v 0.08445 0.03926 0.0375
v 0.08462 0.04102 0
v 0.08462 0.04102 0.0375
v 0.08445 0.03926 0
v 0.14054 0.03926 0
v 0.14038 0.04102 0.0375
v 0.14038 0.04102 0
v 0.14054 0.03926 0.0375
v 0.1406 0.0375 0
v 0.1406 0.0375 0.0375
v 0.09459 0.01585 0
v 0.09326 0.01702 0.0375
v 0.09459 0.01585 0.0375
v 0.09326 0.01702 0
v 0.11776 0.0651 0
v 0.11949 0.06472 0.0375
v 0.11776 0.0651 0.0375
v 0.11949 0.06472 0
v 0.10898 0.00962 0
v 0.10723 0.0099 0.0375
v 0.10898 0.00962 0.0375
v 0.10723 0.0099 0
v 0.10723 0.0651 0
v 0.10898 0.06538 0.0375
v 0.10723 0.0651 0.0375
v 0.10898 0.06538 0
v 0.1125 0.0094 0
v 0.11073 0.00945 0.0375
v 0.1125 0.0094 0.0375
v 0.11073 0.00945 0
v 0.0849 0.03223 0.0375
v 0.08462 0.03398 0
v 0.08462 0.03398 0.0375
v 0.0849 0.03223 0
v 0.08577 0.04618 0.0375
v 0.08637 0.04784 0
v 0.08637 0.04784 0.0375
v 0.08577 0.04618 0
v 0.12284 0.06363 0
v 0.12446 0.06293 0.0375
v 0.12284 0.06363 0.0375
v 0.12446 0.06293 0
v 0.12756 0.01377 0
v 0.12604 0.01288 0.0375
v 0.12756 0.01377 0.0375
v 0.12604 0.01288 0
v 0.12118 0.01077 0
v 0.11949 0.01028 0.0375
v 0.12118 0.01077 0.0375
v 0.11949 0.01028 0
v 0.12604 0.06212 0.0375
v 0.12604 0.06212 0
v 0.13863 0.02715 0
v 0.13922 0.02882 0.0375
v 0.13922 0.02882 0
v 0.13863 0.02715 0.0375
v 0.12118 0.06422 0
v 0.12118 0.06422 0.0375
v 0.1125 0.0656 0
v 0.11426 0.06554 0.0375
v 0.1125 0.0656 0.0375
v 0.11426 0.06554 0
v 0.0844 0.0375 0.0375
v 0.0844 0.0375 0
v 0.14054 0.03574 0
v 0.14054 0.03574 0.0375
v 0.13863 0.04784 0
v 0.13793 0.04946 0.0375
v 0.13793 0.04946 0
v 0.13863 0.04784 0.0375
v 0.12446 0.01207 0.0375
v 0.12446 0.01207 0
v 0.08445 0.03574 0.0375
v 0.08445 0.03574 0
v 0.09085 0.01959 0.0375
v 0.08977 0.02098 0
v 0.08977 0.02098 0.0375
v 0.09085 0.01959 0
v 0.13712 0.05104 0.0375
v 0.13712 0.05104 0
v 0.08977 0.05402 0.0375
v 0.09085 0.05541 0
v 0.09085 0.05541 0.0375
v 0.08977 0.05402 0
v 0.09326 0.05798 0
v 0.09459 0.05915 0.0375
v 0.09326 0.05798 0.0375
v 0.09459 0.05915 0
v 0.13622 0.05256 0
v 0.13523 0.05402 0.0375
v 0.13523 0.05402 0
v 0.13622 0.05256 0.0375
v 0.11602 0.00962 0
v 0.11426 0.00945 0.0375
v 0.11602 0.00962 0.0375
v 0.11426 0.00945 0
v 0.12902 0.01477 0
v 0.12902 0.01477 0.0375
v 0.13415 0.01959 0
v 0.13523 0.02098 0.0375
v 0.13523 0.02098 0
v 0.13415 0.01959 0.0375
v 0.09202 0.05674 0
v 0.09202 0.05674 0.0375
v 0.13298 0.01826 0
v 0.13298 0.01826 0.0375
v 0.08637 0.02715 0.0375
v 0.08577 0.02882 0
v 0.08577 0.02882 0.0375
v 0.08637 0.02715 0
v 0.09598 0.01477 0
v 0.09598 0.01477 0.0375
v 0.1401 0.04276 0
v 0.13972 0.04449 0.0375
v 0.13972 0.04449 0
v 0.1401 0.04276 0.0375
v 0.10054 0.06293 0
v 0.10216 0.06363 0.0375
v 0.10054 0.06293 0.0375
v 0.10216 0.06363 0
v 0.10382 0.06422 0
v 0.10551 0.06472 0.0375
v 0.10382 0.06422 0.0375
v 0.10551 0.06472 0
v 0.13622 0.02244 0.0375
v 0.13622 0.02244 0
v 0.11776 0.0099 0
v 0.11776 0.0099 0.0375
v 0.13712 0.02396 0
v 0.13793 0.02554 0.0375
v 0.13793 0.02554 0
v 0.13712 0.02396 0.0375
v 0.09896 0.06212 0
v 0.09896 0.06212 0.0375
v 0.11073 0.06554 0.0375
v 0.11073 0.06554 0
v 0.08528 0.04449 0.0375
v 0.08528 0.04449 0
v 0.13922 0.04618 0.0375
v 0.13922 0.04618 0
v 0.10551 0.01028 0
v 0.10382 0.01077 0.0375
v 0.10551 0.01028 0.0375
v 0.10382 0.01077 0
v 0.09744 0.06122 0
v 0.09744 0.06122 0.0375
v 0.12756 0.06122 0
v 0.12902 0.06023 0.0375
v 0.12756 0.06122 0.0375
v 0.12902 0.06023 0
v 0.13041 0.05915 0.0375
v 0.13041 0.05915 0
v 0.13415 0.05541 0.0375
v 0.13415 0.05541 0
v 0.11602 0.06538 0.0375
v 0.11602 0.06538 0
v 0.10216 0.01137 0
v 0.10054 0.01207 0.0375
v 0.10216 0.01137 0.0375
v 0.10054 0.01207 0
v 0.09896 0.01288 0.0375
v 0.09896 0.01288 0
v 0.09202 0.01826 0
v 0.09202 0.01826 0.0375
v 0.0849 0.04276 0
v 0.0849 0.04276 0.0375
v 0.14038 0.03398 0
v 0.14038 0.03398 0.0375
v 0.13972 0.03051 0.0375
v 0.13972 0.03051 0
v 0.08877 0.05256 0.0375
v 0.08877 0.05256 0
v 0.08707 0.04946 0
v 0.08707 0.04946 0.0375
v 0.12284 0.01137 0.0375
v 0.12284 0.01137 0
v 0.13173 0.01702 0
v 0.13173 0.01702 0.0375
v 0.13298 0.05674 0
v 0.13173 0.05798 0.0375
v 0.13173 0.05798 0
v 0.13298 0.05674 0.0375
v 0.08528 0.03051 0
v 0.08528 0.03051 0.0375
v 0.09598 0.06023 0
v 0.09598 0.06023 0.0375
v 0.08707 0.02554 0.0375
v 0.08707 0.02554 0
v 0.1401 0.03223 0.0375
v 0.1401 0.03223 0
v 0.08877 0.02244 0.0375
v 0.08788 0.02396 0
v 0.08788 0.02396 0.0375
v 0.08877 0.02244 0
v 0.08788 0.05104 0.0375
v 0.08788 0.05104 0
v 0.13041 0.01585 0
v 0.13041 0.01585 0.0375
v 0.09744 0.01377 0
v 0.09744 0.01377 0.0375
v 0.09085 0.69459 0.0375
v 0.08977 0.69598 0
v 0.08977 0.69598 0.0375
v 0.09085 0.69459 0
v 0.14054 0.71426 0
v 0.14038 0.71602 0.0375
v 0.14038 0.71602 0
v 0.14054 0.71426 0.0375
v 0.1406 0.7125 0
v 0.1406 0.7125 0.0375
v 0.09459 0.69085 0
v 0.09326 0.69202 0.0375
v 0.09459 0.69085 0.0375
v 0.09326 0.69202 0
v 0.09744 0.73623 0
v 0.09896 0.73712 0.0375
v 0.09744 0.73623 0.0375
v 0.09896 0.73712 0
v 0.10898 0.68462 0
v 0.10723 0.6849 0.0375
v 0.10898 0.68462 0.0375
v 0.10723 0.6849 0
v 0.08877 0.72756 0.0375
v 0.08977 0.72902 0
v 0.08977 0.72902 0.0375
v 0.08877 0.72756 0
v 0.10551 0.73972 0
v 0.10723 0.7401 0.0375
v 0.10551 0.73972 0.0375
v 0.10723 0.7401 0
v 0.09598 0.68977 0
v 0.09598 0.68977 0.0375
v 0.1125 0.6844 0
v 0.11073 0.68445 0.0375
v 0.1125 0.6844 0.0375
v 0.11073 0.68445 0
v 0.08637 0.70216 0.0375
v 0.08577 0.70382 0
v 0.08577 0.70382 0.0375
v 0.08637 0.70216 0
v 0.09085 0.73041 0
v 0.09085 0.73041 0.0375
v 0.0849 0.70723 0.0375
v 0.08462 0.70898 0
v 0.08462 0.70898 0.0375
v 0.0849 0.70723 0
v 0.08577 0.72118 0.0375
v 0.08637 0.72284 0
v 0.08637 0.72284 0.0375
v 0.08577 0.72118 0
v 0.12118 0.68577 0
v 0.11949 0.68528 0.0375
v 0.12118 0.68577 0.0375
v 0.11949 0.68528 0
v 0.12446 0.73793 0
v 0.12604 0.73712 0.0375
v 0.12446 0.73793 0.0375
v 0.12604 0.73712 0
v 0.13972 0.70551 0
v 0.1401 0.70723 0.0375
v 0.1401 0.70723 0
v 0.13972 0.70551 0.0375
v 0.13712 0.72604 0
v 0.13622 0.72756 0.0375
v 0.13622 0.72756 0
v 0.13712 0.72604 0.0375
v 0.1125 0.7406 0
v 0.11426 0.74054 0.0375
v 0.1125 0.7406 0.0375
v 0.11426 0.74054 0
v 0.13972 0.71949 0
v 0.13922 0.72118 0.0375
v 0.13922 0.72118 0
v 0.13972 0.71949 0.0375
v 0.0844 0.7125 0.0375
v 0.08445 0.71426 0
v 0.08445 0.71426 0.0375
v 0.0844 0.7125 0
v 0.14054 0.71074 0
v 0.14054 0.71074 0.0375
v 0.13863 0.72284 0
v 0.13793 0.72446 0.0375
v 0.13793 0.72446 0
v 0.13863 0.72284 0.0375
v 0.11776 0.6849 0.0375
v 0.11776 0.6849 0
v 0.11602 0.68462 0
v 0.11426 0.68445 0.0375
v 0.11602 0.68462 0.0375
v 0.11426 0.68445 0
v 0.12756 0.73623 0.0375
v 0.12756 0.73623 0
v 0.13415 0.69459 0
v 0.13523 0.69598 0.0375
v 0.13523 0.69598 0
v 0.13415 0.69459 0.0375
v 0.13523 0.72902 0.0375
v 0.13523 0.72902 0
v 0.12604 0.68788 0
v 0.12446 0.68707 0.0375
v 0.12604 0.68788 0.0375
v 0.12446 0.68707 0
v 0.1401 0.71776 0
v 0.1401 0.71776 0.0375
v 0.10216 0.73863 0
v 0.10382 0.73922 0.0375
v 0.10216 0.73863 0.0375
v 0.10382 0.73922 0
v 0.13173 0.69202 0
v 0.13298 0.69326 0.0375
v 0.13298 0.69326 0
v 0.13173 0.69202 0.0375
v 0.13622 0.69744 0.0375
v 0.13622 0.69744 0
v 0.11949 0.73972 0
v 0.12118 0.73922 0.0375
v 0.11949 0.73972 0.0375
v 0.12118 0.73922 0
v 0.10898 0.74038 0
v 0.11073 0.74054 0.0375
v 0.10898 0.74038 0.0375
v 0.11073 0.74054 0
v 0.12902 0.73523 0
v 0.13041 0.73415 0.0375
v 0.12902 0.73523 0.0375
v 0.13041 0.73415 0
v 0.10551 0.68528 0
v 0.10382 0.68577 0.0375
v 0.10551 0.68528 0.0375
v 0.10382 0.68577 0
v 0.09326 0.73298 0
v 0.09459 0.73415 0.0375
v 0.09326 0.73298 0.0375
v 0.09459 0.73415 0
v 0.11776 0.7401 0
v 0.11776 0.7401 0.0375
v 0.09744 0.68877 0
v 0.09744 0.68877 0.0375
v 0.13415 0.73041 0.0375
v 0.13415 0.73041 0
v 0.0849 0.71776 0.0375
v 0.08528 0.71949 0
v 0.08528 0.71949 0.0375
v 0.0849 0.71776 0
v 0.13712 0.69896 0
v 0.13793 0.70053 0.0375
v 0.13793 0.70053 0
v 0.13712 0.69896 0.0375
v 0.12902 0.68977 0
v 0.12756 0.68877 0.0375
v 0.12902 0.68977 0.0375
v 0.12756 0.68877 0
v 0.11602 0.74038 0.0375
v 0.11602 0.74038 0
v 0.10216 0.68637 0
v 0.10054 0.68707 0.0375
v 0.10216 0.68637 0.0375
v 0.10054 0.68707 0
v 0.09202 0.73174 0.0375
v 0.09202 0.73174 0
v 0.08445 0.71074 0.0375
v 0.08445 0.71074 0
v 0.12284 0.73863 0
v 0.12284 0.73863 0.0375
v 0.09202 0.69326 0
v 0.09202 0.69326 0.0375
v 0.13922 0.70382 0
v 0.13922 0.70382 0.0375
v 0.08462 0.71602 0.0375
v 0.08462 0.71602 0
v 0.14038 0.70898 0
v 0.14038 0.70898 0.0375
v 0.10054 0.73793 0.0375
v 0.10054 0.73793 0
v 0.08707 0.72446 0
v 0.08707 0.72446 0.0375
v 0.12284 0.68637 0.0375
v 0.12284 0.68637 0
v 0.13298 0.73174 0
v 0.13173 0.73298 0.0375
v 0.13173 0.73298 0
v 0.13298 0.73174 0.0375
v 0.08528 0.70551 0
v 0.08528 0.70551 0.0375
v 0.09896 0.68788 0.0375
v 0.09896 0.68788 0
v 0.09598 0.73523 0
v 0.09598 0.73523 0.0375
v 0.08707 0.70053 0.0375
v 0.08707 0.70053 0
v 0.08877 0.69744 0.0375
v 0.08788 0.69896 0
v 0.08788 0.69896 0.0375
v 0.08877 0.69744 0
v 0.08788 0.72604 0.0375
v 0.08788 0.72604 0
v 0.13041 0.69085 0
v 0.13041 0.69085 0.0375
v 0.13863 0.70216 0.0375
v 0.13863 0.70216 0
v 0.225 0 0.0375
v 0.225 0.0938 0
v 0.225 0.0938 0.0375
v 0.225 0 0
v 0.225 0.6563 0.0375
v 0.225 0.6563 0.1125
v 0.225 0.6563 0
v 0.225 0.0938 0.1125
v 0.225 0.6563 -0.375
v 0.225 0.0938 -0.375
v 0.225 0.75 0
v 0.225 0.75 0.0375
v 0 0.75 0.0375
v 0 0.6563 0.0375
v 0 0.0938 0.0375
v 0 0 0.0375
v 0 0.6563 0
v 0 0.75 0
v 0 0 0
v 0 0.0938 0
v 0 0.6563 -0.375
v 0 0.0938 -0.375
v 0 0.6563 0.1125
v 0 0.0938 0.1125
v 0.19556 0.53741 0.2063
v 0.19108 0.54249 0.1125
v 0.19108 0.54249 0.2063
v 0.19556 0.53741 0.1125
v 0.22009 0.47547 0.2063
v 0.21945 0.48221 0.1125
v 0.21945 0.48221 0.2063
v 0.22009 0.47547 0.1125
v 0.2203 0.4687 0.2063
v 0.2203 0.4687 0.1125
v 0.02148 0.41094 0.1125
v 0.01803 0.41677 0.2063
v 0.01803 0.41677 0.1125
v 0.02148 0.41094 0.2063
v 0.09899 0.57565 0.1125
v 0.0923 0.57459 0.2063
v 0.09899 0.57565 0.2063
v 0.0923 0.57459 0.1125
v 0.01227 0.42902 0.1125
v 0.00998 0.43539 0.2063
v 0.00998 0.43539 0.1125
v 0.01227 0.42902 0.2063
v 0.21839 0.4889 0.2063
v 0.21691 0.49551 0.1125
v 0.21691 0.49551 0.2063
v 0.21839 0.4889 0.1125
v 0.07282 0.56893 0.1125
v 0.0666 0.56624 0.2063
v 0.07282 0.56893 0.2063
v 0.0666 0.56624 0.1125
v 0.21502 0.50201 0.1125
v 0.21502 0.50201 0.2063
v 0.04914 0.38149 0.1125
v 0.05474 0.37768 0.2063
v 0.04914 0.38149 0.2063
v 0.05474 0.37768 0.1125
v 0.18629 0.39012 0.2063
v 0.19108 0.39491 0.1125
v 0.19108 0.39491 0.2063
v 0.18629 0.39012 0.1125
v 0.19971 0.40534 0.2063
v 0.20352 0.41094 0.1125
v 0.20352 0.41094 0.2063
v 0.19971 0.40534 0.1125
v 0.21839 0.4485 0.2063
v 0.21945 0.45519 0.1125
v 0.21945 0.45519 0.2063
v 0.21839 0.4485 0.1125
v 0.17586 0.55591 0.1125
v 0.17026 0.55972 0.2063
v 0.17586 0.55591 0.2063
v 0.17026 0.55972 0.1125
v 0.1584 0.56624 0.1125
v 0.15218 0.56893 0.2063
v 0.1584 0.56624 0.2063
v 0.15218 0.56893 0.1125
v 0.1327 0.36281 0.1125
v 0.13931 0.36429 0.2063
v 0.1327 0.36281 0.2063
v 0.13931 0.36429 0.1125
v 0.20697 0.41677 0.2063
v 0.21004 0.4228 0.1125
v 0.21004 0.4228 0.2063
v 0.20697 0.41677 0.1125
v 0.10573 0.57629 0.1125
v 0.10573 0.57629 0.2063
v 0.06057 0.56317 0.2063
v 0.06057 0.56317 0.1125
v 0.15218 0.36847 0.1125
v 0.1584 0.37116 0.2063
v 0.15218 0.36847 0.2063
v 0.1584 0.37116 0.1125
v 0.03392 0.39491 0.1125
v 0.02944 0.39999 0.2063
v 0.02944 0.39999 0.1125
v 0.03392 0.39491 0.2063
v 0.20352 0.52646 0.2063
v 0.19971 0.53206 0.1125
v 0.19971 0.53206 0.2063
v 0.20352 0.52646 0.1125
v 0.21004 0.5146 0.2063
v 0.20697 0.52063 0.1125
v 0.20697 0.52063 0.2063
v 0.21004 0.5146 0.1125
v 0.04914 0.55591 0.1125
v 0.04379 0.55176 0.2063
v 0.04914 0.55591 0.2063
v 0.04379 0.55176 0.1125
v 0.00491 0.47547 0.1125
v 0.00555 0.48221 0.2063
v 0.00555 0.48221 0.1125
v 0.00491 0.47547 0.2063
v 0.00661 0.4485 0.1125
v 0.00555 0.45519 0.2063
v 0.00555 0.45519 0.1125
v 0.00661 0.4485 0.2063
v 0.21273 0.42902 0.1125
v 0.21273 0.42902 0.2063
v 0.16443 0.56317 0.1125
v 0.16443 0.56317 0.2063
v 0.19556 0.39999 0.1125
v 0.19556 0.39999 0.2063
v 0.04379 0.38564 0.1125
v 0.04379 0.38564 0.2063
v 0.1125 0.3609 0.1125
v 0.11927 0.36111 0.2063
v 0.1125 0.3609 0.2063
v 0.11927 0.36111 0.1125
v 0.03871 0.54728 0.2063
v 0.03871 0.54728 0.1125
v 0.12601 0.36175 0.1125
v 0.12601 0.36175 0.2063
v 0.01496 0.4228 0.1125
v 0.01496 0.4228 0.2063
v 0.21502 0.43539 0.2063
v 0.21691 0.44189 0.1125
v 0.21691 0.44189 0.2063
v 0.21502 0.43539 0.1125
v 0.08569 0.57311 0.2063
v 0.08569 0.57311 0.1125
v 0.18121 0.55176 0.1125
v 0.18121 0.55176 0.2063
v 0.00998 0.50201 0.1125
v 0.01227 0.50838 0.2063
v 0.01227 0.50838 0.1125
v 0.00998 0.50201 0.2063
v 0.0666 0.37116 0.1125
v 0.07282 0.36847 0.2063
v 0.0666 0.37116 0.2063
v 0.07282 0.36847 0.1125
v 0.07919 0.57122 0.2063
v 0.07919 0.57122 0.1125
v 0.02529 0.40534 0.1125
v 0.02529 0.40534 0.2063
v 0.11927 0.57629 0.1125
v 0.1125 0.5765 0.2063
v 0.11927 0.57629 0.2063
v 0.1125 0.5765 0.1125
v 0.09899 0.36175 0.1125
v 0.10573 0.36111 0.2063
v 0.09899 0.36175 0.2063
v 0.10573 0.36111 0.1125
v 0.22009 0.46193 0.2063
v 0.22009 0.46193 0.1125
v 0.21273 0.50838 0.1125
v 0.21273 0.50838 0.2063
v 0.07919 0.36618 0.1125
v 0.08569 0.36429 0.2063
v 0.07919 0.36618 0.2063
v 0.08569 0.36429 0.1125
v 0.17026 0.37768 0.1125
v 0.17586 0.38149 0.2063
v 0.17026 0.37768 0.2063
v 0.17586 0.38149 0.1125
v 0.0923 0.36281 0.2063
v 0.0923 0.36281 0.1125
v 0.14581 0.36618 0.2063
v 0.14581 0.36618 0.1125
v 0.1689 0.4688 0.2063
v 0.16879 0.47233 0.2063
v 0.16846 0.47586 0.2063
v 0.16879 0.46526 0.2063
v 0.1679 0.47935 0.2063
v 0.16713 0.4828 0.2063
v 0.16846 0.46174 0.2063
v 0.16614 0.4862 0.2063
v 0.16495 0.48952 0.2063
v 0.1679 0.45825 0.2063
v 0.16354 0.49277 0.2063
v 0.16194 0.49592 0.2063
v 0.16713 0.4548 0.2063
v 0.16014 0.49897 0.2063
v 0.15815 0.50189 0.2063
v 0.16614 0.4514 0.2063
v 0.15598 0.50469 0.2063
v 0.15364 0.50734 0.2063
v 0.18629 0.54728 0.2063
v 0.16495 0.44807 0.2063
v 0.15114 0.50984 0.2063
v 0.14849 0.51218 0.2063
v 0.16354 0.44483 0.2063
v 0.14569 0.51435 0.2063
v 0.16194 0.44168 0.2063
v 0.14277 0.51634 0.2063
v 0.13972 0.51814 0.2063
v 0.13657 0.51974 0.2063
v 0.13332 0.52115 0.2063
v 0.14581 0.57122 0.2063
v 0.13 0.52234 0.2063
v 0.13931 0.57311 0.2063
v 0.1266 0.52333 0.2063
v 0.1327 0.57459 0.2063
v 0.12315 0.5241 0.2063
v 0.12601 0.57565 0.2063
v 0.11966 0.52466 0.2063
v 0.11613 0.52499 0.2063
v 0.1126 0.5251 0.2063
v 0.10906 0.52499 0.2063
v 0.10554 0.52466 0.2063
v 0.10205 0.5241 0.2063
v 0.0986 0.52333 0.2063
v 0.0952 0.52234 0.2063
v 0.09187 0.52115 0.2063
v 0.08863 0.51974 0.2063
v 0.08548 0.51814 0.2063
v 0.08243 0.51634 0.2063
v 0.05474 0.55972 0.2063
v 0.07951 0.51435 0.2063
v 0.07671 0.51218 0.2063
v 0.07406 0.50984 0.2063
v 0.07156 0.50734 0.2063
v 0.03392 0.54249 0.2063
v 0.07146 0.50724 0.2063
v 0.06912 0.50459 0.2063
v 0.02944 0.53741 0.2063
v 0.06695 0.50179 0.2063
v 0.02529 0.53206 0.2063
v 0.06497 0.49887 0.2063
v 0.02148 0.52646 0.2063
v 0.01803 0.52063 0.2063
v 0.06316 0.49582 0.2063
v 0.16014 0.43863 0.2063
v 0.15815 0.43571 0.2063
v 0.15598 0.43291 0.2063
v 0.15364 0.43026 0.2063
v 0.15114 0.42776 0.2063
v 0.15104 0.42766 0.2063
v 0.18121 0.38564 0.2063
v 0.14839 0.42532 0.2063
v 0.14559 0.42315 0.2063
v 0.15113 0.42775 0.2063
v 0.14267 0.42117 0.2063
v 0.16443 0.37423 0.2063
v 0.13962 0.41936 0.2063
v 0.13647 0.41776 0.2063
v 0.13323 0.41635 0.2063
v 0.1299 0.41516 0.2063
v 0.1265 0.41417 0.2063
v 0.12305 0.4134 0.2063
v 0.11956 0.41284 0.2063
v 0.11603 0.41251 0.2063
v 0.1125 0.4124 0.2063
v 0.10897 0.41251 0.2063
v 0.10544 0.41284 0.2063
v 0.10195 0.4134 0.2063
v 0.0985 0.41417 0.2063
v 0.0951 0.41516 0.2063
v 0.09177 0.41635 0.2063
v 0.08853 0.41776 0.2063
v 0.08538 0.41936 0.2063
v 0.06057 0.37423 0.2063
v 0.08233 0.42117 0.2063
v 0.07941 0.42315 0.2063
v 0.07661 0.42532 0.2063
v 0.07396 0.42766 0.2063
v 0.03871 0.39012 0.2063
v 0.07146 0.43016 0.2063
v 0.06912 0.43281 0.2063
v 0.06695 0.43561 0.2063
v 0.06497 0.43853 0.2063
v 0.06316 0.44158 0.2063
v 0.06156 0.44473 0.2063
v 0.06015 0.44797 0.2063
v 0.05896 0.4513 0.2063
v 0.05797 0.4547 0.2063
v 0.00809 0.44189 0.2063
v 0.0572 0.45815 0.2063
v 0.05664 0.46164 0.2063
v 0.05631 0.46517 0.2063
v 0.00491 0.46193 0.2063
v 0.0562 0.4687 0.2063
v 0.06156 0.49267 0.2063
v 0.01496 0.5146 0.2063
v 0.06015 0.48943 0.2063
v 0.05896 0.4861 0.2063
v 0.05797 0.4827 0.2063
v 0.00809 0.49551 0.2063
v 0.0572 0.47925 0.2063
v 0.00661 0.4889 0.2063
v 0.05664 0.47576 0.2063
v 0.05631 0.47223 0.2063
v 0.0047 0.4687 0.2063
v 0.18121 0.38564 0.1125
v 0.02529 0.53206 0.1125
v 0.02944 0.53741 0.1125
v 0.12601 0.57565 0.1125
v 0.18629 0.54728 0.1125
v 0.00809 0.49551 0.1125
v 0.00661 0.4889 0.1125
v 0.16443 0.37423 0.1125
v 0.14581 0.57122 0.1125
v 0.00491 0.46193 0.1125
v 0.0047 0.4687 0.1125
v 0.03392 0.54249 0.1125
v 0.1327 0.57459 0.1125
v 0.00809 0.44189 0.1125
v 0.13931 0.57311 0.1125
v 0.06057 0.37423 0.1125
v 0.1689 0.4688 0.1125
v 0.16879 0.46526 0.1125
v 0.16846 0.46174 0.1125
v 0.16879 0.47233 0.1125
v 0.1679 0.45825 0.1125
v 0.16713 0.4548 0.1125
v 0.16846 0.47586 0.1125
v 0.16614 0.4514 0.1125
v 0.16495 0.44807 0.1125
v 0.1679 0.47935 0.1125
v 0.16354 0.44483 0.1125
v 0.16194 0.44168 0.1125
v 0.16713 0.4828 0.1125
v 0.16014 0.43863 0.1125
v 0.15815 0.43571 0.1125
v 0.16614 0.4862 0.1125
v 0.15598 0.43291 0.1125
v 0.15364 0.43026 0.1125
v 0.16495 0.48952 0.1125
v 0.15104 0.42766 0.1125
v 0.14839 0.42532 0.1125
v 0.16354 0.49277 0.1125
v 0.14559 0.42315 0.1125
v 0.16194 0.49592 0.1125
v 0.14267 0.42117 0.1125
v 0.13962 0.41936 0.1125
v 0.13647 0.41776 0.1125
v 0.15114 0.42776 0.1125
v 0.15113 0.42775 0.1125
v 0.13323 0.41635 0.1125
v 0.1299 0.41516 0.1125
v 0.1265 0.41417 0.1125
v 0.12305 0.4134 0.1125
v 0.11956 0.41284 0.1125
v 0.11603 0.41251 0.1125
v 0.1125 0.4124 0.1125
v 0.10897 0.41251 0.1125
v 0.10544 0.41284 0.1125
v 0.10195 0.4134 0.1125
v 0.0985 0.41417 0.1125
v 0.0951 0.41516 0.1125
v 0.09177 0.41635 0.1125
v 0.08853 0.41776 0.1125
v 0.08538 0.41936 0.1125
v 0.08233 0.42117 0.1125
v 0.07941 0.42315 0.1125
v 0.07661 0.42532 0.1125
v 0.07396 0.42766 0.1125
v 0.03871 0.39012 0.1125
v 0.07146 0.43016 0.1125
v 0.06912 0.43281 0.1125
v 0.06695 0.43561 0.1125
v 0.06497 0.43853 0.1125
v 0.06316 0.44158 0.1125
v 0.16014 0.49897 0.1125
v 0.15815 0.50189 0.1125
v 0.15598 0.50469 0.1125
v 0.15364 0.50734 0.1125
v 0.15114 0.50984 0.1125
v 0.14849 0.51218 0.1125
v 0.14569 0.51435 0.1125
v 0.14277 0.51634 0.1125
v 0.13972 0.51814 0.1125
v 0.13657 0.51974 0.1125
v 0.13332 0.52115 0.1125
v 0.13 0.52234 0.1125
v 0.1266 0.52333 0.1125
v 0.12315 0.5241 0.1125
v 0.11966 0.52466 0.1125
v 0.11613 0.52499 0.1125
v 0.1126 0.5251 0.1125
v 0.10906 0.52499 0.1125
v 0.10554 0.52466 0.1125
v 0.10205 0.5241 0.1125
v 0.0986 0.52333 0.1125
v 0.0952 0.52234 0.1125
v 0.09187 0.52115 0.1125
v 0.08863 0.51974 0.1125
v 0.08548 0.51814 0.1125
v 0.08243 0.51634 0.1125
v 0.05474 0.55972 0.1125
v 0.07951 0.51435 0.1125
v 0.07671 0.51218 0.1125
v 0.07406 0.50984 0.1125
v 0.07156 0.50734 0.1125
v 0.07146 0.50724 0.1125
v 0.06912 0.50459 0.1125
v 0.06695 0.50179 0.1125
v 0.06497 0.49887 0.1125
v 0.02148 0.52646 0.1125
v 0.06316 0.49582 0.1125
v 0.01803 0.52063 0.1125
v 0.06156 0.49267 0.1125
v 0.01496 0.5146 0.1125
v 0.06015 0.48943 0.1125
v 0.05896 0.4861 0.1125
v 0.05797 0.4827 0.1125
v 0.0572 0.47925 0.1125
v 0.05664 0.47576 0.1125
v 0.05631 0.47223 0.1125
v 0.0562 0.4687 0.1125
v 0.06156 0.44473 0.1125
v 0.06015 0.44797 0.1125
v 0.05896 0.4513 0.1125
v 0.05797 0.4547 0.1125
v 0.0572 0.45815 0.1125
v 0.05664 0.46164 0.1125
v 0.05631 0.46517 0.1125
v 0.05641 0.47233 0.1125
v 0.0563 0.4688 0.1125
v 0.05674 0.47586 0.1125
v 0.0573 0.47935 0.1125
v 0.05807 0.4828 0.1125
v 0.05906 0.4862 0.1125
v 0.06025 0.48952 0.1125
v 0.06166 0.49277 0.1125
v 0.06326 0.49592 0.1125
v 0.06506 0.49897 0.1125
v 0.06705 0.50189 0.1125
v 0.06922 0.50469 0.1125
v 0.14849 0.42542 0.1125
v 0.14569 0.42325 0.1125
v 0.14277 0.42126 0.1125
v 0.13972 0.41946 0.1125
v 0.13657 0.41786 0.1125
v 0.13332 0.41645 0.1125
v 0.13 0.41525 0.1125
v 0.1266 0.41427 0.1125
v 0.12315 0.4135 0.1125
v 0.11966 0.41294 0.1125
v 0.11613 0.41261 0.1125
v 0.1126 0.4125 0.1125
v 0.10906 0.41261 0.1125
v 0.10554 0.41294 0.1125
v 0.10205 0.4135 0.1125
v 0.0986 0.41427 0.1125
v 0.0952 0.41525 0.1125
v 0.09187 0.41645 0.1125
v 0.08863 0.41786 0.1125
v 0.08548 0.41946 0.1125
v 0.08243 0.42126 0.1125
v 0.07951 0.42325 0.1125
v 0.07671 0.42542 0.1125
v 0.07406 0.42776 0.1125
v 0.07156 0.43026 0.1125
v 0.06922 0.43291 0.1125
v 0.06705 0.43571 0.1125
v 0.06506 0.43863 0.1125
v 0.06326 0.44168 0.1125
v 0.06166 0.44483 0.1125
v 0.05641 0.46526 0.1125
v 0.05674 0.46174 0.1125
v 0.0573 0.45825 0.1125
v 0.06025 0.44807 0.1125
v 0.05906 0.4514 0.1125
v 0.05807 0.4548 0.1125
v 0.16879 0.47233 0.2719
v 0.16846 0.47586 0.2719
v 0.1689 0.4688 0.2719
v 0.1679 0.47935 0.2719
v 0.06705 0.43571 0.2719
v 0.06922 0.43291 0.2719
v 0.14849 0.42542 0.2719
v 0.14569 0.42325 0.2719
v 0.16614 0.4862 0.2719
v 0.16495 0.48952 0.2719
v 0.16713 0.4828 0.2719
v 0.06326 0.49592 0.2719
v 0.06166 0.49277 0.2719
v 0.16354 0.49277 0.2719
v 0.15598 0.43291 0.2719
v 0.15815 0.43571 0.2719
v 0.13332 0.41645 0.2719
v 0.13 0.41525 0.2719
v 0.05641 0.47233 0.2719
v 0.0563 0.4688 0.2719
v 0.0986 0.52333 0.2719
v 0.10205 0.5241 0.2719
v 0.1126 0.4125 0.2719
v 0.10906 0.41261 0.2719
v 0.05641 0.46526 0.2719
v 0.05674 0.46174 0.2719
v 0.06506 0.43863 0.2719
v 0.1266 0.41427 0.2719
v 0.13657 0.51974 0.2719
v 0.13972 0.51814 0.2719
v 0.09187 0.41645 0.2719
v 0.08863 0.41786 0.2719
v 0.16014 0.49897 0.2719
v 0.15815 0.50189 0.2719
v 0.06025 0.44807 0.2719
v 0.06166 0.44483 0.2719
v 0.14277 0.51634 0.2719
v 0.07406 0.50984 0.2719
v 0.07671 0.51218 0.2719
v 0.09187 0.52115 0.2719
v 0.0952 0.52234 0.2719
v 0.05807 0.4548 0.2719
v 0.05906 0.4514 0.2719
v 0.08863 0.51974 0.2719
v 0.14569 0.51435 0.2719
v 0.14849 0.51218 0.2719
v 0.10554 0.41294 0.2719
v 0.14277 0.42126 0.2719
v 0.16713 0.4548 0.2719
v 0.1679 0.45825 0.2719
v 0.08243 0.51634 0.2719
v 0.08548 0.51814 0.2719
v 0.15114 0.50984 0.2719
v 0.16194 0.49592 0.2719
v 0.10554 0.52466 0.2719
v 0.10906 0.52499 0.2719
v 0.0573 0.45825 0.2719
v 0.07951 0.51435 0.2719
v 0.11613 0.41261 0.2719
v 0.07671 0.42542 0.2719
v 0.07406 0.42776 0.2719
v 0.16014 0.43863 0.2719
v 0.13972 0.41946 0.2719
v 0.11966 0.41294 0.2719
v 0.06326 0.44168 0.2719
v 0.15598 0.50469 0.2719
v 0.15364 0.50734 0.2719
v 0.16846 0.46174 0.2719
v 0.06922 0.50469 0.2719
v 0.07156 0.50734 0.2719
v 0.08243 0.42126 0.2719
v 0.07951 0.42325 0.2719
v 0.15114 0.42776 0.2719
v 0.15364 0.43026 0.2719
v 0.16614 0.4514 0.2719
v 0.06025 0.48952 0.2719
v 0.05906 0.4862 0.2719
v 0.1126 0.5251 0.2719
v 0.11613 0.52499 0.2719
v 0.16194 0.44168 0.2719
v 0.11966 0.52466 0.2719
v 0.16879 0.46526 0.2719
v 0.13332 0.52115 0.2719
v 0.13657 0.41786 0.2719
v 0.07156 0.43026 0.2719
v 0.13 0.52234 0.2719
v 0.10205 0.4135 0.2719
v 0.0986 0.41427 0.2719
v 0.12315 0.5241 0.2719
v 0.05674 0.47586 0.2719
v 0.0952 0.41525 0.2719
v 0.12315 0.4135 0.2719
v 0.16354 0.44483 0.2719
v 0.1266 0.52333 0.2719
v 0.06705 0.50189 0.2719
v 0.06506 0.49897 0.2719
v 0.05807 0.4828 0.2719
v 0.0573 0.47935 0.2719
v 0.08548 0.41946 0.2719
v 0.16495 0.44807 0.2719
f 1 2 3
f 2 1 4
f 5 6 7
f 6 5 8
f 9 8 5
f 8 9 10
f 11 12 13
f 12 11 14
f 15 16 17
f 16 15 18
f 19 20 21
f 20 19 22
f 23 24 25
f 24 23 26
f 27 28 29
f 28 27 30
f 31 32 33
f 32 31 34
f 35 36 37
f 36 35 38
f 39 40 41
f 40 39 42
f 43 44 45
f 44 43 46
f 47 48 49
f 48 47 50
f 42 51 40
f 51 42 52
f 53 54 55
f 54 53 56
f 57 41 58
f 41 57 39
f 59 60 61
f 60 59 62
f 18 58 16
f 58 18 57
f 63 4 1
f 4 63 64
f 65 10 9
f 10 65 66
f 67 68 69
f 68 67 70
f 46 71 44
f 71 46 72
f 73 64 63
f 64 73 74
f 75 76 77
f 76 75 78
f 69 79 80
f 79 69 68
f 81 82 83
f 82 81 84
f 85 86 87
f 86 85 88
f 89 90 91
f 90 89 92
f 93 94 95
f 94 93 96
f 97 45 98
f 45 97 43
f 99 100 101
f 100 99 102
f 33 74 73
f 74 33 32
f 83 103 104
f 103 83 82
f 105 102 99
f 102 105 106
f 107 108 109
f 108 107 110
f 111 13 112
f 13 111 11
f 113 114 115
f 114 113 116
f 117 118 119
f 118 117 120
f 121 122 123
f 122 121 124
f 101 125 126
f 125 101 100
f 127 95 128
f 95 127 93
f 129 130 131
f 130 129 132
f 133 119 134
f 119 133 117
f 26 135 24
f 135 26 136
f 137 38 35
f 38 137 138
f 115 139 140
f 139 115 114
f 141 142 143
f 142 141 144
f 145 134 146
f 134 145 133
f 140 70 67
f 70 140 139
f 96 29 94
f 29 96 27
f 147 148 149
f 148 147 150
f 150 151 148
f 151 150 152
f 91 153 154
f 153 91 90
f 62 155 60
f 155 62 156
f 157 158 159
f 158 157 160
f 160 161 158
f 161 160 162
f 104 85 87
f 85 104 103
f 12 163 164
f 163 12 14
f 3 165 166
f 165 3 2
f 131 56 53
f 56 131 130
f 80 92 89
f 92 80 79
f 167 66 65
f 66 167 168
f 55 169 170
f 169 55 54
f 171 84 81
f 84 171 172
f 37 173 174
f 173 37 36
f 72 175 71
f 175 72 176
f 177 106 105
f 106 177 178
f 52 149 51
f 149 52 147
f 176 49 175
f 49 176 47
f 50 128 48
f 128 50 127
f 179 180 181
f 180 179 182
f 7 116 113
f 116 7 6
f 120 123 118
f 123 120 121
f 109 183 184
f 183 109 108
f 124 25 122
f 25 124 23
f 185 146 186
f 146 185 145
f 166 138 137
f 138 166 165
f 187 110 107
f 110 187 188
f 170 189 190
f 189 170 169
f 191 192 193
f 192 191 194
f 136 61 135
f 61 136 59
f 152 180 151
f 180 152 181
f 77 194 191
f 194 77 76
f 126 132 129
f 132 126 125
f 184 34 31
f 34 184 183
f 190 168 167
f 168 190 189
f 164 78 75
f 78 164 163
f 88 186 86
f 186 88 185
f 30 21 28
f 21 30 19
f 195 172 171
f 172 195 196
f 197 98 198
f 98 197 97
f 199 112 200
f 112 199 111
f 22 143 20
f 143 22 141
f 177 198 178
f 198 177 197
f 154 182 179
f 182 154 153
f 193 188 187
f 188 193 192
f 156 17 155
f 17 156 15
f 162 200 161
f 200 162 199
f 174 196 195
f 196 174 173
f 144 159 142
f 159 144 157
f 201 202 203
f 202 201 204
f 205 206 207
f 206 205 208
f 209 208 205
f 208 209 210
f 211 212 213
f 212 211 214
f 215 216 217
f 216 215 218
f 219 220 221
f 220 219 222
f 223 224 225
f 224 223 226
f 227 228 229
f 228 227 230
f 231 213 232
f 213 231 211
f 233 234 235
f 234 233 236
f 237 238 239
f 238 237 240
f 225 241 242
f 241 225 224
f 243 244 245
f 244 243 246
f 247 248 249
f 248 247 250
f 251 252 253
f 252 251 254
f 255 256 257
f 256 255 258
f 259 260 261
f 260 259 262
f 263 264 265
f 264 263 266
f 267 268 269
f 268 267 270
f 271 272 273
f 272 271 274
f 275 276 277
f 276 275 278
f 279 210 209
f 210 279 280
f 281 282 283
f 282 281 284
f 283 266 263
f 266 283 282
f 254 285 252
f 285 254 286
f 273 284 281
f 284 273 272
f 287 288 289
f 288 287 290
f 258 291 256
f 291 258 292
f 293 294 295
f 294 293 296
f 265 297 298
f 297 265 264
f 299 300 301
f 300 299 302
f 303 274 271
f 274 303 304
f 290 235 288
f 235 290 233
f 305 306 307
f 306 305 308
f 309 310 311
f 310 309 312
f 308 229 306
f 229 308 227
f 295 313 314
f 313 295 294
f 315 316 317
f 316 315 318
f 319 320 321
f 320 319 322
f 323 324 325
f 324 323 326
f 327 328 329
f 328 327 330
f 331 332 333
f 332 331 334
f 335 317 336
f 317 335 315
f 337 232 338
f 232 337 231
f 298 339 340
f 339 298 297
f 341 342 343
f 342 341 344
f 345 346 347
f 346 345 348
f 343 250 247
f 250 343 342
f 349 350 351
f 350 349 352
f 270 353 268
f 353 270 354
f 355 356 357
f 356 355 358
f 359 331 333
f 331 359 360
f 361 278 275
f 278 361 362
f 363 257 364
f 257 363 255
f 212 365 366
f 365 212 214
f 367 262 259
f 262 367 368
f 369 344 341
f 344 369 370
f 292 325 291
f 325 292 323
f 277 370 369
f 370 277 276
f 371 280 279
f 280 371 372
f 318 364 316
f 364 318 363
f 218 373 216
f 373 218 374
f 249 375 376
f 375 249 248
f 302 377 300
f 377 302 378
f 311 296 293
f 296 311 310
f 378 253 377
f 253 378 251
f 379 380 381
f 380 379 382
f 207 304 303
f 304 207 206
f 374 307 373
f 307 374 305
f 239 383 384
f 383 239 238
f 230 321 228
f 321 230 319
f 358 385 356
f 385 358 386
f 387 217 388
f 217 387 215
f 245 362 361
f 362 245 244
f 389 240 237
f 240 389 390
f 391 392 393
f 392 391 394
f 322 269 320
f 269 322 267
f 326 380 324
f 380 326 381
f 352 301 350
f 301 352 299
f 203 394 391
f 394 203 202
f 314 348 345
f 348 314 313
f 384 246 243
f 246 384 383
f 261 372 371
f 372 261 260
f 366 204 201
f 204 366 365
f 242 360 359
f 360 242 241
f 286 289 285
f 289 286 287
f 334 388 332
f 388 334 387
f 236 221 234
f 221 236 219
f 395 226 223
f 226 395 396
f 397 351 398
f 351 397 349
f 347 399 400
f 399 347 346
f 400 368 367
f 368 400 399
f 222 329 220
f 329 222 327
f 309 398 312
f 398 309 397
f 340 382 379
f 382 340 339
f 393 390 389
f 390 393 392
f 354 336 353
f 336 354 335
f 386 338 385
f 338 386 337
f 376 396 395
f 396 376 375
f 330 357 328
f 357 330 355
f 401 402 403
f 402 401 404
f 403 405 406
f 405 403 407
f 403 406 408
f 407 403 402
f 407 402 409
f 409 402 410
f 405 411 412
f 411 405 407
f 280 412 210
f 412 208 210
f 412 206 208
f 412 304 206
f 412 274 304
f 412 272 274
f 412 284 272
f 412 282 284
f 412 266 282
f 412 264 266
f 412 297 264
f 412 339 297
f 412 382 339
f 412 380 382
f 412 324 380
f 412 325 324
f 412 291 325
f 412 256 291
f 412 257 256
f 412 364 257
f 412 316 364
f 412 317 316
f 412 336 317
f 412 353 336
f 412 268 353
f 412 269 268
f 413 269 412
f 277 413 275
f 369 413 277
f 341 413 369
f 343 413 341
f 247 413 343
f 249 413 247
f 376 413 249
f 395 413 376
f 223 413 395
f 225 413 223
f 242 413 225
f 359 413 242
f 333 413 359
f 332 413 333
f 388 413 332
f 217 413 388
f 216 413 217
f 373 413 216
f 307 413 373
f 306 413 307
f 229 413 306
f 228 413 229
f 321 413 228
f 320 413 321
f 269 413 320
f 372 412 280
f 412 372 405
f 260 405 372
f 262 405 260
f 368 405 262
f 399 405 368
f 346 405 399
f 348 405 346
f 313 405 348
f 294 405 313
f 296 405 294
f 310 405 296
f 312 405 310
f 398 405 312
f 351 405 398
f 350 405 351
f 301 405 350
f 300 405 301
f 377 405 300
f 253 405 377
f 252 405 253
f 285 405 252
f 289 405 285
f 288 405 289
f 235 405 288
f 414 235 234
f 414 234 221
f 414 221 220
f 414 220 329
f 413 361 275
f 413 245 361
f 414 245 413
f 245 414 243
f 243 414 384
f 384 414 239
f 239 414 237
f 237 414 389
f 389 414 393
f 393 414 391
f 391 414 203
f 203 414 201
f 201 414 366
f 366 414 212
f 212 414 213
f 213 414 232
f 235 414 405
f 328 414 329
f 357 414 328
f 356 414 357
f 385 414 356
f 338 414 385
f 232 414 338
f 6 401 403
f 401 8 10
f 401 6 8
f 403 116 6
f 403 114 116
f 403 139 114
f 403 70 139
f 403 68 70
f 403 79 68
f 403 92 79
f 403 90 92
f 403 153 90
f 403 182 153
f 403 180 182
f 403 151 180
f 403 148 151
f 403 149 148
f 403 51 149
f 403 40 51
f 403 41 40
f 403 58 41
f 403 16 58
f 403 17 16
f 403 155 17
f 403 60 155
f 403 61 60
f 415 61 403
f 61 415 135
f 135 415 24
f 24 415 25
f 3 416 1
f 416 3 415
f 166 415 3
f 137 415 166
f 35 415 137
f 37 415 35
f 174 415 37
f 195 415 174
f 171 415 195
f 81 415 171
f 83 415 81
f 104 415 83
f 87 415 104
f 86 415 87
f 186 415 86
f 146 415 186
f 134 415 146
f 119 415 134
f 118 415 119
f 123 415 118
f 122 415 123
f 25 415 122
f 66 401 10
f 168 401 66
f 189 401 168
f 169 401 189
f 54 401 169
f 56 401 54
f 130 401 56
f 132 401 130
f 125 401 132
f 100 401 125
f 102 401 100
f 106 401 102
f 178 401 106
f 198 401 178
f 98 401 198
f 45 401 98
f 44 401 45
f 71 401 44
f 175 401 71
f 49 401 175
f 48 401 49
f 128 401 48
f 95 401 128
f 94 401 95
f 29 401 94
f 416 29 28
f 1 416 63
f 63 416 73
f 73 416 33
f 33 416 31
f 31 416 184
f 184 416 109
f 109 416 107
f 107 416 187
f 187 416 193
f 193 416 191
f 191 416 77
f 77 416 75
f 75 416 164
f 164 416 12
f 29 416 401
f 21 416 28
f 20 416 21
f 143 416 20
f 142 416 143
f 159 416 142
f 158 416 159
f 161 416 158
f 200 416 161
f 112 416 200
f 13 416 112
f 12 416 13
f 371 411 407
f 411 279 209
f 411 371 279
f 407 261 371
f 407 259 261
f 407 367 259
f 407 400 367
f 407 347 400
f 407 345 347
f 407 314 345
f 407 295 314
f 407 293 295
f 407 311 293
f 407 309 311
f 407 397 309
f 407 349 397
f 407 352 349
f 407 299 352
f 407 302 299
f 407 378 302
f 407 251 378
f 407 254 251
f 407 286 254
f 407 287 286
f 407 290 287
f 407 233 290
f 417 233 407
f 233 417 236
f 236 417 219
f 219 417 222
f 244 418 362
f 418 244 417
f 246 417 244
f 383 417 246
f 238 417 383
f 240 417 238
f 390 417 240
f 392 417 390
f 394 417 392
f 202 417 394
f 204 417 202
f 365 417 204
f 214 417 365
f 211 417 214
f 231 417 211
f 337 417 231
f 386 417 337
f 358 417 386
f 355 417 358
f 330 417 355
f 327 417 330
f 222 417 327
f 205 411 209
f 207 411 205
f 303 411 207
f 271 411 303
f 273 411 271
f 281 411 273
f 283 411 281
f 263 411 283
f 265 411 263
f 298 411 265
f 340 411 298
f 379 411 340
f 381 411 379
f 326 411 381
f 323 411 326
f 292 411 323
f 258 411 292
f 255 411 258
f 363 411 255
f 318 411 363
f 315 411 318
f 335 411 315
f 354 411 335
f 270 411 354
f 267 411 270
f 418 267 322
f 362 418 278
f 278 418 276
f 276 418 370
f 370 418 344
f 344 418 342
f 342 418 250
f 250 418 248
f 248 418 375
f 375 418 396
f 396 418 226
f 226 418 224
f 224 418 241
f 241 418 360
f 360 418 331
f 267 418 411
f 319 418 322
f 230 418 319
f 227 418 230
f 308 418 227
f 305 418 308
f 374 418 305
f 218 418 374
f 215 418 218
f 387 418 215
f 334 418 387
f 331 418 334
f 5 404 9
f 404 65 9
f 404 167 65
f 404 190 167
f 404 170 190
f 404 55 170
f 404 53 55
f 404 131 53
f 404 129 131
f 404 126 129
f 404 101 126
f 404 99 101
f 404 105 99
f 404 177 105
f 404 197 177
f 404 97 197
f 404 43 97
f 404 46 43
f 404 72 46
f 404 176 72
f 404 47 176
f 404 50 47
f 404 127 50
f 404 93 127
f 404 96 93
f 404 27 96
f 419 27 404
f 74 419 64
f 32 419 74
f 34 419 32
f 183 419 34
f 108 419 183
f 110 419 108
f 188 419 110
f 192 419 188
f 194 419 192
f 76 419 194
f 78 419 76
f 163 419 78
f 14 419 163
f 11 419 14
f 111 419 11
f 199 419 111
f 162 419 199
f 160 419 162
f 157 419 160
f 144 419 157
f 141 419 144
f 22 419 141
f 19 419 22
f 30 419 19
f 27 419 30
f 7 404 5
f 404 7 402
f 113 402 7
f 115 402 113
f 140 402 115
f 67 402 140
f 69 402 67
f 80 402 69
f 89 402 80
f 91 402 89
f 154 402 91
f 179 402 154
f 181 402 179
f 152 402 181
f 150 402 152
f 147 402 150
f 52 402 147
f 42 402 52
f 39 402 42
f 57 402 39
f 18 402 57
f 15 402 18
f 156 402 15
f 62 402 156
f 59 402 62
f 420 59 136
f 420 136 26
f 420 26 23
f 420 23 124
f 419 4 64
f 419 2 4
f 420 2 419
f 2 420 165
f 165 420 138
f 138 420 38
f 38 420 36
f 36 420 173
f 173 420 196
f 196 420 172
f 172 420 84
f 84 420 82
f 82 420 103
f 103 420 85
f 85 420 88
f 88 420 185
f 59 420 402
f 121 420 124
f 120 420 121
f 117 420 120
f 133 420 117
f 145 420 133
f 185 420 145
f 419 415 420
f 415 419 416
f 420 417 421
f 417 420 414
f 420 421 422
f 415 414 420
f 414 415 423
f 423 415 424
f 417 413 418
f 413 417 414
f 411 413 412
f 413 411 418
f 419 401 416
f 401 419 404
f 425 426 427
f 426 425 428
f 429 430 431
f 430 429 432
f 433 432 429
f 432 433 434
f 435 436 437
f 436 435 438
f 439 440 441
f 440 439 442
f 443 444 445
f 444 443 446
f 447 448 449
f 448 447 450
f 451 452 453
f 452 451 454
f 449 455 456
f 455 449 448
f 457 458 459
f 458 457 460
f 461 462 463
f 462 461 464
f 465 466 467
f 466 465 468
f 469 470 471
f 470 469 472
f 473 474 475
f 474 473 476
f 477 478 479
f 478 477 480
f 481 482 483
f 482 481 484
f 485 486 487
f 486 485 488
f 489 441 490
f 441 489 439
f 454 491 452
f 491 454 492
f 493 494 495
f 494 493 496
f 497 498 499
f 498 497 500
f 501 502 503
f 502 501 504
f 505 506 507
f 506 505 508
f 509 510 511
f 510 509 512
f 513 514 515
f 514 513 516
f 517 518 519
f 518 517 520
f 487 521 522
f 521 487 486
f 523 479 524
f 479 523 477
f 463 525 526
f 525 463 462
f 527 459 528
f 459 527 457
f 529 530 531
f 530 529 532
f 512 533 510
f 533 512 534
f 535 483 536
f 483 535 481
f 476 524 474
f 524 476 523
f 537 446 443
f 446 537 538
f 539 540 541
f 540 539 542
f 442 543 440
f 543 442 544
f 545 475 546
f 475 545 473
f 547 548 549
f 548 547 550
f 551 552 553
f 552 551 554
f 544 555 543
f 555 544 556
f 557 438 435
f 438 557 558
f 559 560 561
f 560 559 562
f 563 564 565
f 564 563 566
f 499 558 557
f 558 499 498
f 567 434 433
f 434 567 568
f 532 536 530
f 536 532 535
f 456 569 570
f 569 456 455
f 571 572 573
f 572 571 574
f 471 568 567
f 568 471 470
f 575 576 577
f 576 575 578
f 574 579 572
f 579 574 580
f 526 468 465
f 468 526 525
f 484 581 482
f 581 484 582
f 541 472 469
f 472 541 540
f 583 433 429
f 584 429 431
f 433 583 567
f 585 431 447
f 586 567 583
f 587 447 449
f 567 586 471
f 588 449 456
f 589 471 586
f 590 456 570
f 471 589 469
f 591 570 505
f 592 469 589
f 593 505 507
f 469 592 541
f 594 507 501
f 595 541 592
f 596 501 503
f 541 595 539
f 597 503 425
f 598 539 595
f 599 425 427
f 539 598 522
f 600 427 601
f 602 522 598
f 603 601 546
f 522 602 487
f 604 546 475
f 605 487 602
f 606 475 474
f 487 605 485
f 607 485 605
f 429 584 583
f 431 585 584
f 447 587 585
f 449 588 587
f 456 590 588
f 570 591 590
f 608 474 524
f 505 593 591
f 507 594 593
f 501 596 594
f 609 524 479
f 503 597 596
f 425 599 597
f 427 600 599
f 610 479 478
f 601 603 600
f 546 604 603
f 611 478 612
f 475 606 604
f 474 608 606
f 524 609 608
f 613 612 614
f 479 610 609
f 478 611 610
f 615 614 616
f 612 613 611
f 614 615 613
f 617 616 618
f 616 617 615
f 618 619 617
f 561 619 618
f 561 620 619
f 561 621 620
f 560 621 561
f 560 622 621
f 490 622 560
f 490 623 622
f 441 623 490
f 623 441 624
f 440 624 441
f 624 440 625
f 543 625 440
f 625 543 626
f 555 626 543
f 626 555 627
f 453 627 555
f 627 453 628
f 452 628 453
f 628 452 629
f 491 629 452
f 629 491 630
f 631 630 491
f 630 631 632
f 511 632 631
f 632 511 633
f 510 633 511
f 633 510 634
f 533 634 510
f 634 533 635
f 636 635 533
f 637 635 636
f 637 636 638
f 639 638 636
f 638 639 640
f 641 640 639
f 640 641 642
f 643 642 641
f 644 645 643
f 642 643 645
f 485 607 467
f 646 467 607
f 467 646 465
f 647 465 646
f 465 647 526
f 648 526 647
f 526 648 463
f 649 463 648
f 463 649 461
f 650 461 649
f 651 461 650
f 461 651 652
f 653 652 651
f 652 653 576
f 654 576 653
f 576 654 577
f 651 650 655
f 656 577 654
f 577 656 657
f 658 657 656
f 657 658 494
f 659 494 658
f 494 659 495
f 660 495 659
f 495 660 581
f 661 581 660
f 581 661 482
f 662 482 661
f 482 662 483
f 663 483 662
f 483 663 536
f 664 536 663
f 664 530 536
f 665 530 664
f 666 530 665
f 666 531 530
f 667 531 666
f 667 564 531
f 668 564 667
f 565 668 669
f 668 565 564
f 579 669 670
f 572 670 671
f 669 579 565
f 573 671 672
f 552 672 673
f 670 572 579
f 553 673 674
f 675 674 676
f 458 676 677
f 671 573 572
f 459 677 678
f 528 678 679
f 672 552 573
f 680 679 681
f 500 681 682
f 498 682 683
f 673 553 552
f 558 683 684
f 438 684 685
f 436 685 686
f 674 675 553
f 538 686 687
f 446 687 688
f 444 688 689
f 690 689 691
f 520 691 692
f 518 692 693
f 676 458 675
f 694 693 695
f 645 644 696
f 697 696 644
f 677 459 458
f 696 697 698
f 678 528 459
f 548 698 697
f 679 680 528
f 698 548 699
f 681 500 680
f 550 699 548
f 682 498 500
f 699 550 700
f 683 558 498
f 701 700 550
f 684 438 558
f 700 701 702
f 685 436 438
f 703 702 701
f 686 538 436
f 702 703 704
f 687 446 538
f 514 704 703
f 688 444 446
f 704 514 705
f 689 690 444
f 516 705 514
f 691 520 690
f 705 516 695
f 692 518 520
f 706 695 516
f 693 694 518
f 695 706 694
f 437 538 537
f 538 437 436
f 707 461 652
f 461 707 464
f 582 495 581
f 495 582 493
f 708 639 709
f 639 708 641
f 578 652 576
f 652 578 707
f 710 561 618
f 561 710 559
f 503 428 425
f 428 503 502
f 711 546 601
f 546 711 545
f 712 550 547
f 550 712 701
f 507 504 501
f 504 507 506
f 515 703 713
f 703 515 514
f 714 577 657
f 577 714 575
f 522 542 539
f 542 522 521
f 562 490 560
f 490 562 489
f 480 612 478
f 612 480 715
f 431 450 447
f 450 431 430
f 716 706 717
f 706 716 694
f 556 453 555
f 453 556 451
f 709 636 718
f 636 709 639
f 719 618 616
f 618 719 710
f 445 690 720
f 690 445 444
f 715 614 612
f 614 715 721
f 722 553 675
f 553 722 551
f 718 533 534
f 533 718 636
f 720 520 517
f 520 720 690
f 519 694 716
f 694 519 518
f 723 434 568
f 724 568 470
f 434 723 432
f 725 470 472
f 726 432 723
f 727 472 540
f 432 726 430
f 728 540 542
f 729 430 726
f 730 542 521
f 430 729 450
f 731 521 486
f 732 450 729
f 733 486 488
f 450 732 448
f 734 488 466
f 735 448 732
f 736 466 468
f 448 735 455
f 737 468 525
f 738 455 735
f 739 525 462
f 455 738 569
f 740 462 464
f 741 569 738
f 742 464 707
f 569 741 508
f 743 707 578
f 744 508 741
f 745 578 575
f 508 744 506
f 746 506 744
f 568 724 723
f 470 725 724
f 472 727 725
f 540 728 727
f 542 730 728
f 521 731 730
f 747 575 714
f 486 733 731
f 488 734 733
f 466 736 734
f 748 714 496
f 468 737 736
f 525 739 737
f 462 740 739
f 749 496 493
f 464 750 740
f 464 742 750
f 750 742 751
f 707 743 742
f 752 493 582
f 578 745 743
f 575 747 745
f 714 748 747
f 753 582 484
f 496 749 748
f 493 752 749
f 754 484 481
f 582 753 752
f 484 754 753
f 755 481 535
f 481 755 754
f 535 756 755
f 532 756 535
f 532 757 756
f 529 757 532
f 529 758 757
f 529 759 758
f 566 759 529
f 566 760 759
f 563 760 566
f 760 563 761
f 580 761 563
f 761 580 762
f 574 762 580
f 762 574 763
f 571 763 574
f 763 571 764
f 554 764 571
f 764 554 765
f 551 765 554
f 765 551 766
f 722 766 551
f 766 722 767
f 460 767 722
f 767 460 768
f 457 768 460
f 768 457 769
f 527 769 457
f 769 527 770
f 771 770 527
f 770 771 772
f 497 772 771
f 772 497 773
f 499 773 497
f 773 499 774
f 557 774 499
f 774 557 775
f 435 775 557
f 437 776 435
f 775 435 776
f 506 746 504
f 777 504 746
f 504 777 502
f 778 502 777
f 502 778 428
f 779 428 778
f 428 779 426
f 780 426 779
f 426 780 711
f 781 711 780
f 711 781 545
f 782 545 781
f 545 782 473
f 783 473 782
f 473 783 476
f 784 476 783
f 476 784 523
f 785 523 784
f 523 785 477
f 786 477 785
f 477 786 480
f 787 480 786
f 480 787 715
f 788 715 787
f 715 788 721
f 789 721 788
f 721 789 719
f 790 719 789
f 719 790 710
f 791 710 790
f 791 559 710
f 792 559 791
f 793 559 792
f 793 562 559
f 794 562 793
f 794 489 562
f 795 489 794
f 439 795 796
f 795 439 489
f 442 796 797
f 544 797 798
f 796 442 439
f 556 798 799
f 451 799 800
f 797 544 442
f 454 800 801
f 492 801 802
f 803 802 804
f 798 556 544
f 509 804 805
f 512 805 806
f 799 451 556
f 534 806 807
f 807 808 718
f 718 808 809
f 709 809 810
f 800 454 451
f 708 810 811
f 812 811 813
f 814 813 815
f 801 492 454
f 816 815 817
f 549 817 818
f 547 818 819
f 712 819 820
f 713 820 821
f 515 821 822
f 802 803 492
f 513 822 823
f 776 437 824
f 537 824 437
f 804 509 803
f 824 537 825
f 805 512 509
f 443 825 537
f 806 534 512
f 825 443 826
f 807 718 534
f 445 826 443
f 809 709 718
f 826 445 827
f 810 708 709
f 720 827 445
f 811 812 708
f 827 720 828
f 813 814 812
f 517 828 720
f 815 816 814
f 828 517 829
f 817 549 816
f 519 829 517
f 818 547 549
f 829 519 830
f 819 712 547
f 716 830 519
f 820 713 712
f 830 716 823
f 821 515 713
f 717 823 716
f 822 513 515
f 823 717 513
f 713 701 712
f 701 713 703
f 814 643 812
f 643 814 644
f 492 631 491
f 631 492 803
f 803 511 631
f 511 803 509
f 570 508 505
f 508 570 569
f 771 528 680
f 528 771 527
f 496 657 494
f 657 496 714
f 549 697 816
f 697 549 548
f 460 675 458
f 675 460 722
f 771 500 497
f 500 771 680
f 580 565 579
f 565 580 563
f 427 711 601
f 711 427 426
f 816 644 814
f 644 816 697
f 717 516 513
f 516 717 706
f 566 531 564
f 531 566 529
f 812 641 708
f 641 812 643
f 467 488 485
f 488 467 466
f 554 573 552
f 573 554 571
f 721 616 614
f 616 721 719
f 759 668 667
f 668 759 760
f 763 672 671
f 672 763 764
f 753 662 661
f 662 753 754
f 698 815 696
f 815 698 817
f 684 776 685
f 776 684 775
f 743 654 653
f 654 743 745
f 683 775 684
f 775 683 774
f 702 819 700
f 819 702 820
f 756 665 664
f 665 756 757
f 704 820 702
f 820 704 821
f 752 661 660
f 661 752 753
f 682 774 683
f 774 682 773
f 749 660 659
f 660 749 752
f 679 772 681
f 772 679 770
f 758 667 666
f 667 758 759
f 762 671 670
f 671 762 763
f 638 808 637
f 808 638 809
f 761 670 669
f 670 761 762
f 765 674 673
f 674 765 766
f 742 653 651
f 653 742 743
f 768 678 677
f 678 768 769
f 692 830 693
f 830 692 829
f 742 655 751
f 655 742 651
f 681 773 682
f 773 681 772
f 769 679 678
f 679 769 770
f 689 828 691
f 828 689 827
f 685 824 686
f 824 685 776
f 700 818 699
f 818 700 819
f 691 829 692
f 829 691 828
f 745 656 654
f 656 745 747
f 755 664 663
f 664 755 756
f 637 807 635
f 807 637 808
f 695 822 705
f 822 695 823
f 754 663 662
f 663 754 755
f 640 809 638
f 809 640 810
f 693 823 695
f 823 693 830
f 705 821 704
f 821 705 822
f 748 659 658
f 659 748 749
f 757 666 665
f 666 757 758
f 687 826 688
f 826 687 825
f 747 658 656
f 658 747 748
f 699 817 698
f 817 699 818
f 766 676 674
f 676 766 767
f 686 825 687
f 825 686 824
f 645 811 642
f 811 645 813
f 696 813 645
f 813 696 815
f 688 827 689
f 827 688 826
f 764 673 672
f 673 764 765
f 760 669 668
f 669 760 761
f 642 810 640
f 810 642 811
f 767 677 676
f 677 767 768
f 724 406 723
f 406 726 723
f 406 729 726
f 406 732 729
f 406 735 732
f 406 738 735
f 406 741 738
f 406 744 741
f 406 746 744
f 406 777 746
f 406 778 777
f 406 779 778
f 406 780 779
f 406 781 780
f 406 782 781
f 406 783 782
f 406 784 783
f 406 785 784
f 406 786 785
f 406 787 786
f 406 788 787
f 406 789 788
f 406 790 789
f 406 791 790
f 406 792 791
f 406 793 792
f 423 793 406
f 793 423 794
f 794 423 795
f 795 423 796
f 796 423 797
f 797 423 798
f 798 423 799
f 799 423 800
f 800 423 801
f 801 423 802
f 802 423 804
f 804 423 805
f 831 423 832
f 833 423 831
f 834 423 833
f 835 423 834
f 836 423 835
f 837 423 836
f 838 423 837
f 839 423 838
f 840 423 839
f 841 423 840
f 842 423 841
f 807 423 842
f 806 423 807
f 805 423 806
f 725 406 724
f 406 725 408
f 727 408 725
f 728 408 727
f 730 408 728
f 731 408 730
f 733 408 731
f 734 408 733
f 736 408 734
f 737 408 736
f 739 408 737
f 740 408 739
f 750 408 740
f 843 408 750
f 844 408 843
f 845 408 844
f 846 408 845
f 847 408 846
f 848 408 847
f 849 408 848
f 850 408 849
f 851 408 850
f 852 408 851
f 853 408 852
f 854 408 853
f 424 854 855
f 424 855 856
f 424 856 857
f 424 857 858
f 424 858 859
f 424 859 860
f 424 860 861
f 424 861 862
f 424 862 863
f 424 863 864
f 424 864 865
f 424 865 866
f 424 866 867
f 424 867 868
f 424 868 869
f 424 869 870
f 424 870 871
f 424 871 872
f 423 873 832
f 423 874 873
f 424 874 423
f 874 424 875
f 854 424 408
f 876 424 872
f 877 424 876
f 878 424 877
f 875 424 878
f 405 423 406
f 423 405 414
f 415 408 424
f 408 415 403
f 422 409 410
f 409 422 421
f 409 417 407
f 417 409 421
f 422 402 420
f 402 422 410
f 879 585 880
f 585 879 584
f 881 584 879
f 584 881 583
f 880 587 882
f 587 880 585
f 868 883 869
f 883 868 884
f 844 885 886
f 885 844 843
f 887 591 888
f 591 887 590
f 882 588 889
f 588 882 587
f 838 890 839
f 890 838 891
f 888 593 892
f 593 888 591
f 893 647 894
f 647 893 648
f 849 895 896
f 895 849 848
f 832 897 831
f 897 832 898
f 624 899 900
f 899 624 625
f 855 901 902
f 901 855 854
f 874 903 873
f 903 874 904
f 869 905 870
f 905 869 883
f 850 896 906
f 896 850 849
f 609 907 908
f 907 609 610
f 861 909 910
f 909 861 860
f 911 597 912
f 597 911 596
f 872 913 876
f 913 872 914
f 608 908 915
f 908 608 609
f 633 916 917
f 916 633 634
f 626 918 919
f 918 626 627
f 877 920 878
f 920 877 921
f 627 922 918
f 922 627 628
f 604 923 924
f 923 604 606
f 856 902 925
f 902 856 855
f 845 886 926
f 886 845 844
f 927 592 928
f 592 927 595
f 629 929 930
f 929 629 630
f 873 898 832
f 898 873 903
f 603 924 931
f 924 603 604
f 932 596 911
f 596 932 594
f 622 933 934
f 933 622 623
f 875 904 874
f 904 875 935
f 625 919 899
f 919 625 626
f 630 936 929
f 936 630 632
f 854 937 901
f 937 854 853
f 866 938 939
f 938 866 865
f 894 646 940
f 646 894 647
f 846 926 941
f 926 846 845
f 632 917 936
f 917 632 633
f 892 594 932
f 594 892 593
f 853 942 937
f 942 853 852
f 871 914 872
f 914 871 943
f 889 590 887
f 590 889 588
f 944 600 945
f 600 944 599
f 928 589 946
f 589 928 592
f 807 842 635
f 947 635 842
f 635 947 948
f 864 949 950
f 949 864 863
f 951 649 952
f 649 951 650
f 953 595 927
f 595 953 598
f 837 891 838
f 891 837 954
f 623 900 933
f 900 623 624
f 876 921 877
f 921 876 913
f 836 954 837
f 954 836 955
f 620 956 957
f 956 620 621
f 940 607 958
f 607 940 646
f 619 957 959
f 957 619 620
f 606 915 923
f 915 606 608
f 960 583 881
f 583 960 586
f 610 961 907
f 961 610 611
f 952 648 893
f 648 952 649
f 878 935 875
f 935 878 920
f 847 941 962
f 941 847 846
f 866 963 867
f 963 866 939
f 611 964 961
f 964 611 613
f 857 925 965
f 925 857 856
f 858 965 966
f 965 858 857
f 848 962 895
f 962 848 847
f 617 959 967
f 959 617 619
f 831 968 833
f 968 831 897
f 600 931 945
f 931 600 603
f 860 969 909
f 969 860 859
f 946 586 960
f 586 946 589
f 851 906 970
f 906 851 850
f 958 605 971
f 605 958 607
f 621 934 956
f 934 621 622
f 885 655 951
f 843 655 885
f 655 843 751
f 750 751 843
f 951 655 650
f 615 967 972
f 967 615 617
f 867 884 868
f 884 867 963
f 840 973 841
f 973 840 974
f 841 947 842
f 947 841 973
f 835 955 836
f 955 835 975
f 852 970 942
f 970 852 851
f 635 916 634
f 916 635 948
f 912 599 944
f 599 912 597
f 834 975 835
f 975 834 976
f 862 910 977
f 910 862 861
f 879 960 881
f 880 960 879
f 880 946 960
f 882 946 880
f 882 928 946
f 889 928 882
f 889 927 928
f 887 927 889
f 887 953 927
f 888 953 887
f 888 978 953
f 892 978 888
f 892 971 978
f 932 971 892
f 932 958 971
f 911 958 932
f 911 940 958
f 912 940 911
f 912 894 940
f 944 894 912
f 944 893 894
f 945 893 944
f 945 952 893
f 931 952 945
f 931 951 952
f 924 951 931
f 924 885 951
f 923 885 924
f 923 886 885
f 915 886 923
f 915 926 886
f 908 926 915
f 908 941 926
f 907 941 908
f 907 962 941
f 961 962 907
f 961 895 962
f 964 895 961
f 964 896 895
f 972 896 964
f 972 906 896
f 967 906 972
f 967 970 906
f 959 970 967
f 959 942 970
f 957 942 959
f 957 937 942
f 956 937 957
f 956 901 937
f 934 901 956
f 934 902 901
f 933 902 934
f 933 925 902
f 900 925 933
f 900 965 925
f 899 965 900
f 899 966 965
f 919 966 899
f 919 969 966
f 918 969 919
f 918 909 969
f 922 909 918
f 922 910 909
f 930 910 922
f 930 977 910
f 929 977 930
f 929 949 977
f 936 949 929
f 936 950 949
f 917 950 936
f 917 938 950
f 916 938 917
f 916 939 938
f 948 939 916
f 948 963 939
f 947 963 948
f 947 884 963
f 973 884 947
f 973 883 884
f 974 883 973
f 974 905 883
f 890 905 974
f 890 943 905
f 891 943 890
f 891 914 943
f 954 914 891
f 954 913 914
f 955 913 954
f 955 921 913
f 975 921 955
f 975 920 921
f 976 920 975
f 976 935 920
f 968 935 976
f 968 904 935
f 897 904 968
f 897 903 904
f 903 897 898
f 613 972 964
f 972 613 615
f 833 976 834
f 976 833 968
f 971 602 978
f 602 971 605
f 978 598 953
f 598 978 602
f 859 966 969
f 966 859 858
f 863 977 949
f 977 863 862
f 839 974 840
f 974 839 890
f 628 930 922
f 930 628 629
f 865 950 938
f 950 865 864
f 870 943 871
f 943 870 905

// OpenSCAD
// Parametric dimensions for the CAD model
// All dimensions in meters

// Main rectangular plate
plate_length = 0.225;
plate_width = 0.75;
plate_thickness = 0.0375;

// Through holes
hole_radius = 0.0281;
hole_x_offset = 0.1125;
hole_y_offsets = [0.0375, 0.7125];

// Upper rectangular solid
upper_solid_length = plate_length;
upper_solid_width = 0.5625;
upper_solid_front_offset = 0.0938;
upper_solid_back_offset = 0.0937;
upper_solid_height = 0.1125 - plate_thickness; // Height above plate

// Underside rectangular solid
underside_solid_length = plate_length;
underside_solid_width = 0.5625;
underside_solid_front_offset = 0.0938;
underside_solid_back_offset = 0.0937;
underside_solid_height = 0.375; // Extends downward

// Annular boss (lower section)
annular_outer_radius = 0.1078;
annular_inner_radius = 0.0563;
annular_height = 0.0938;
annular_x_offset = 0.1125;
annular_y_offset = 0.4687;
annular_shoulder_z = plate_thickness + upper_solid_height; // Base of boss

// Upper solid pin
pin_radius = 0.0563;
pin_x_offset = 0.1126;
pin_y_offset = 0.4688;
pin_height = 0.1594; // Height above shoulder

$fn = 100; // Smooth curves

// Main assembly
union() {
    // Main plate with through holes
    difference() {
        // Base plate
        cube([plate_length, plate_width, plate_thickness]);
        
        // Through holes near ends
        for (y_offset = hole_y_offsets) {
            translate([hole_x_offset, y_offset, -0.001])
                cylinder(h = plate_thickness + 0.002, r = hole_radius);
        }
    }
    
    // Upper rectangular solid on plate
    translate([0, upper_solid_front_offset, plate_thickness])
        cube([upper_solid_length, upper_solid_width, upper_solid_height]);
    
    // Underside rectangular solid below plate
    translate([0, underside_solid_front_offset, -underside_solid_height])
        cube([underside_solid_length, underside_solid_width, underside_solid_height]);
    
    // Annular boss (hollow ring)
    translate([annular_x_offset, annular_y_offset, annular_shoulder_z])
        difference() {
            // Outer cylinder
            cylinder(h = annular_height, r = annular_outer_radius);
            // Inner hole (subtract)
            translate([0, 0, -0.001])
                cylinder(h = annular_height + 0.002, r = annular_inner_radius);
        }
    
    // Upper solid pin
    translate([pin_x_offset, pin_y_offset, annular_shoulder_z])
        cylinder(h = pin_height, r = pin_radius);
}
